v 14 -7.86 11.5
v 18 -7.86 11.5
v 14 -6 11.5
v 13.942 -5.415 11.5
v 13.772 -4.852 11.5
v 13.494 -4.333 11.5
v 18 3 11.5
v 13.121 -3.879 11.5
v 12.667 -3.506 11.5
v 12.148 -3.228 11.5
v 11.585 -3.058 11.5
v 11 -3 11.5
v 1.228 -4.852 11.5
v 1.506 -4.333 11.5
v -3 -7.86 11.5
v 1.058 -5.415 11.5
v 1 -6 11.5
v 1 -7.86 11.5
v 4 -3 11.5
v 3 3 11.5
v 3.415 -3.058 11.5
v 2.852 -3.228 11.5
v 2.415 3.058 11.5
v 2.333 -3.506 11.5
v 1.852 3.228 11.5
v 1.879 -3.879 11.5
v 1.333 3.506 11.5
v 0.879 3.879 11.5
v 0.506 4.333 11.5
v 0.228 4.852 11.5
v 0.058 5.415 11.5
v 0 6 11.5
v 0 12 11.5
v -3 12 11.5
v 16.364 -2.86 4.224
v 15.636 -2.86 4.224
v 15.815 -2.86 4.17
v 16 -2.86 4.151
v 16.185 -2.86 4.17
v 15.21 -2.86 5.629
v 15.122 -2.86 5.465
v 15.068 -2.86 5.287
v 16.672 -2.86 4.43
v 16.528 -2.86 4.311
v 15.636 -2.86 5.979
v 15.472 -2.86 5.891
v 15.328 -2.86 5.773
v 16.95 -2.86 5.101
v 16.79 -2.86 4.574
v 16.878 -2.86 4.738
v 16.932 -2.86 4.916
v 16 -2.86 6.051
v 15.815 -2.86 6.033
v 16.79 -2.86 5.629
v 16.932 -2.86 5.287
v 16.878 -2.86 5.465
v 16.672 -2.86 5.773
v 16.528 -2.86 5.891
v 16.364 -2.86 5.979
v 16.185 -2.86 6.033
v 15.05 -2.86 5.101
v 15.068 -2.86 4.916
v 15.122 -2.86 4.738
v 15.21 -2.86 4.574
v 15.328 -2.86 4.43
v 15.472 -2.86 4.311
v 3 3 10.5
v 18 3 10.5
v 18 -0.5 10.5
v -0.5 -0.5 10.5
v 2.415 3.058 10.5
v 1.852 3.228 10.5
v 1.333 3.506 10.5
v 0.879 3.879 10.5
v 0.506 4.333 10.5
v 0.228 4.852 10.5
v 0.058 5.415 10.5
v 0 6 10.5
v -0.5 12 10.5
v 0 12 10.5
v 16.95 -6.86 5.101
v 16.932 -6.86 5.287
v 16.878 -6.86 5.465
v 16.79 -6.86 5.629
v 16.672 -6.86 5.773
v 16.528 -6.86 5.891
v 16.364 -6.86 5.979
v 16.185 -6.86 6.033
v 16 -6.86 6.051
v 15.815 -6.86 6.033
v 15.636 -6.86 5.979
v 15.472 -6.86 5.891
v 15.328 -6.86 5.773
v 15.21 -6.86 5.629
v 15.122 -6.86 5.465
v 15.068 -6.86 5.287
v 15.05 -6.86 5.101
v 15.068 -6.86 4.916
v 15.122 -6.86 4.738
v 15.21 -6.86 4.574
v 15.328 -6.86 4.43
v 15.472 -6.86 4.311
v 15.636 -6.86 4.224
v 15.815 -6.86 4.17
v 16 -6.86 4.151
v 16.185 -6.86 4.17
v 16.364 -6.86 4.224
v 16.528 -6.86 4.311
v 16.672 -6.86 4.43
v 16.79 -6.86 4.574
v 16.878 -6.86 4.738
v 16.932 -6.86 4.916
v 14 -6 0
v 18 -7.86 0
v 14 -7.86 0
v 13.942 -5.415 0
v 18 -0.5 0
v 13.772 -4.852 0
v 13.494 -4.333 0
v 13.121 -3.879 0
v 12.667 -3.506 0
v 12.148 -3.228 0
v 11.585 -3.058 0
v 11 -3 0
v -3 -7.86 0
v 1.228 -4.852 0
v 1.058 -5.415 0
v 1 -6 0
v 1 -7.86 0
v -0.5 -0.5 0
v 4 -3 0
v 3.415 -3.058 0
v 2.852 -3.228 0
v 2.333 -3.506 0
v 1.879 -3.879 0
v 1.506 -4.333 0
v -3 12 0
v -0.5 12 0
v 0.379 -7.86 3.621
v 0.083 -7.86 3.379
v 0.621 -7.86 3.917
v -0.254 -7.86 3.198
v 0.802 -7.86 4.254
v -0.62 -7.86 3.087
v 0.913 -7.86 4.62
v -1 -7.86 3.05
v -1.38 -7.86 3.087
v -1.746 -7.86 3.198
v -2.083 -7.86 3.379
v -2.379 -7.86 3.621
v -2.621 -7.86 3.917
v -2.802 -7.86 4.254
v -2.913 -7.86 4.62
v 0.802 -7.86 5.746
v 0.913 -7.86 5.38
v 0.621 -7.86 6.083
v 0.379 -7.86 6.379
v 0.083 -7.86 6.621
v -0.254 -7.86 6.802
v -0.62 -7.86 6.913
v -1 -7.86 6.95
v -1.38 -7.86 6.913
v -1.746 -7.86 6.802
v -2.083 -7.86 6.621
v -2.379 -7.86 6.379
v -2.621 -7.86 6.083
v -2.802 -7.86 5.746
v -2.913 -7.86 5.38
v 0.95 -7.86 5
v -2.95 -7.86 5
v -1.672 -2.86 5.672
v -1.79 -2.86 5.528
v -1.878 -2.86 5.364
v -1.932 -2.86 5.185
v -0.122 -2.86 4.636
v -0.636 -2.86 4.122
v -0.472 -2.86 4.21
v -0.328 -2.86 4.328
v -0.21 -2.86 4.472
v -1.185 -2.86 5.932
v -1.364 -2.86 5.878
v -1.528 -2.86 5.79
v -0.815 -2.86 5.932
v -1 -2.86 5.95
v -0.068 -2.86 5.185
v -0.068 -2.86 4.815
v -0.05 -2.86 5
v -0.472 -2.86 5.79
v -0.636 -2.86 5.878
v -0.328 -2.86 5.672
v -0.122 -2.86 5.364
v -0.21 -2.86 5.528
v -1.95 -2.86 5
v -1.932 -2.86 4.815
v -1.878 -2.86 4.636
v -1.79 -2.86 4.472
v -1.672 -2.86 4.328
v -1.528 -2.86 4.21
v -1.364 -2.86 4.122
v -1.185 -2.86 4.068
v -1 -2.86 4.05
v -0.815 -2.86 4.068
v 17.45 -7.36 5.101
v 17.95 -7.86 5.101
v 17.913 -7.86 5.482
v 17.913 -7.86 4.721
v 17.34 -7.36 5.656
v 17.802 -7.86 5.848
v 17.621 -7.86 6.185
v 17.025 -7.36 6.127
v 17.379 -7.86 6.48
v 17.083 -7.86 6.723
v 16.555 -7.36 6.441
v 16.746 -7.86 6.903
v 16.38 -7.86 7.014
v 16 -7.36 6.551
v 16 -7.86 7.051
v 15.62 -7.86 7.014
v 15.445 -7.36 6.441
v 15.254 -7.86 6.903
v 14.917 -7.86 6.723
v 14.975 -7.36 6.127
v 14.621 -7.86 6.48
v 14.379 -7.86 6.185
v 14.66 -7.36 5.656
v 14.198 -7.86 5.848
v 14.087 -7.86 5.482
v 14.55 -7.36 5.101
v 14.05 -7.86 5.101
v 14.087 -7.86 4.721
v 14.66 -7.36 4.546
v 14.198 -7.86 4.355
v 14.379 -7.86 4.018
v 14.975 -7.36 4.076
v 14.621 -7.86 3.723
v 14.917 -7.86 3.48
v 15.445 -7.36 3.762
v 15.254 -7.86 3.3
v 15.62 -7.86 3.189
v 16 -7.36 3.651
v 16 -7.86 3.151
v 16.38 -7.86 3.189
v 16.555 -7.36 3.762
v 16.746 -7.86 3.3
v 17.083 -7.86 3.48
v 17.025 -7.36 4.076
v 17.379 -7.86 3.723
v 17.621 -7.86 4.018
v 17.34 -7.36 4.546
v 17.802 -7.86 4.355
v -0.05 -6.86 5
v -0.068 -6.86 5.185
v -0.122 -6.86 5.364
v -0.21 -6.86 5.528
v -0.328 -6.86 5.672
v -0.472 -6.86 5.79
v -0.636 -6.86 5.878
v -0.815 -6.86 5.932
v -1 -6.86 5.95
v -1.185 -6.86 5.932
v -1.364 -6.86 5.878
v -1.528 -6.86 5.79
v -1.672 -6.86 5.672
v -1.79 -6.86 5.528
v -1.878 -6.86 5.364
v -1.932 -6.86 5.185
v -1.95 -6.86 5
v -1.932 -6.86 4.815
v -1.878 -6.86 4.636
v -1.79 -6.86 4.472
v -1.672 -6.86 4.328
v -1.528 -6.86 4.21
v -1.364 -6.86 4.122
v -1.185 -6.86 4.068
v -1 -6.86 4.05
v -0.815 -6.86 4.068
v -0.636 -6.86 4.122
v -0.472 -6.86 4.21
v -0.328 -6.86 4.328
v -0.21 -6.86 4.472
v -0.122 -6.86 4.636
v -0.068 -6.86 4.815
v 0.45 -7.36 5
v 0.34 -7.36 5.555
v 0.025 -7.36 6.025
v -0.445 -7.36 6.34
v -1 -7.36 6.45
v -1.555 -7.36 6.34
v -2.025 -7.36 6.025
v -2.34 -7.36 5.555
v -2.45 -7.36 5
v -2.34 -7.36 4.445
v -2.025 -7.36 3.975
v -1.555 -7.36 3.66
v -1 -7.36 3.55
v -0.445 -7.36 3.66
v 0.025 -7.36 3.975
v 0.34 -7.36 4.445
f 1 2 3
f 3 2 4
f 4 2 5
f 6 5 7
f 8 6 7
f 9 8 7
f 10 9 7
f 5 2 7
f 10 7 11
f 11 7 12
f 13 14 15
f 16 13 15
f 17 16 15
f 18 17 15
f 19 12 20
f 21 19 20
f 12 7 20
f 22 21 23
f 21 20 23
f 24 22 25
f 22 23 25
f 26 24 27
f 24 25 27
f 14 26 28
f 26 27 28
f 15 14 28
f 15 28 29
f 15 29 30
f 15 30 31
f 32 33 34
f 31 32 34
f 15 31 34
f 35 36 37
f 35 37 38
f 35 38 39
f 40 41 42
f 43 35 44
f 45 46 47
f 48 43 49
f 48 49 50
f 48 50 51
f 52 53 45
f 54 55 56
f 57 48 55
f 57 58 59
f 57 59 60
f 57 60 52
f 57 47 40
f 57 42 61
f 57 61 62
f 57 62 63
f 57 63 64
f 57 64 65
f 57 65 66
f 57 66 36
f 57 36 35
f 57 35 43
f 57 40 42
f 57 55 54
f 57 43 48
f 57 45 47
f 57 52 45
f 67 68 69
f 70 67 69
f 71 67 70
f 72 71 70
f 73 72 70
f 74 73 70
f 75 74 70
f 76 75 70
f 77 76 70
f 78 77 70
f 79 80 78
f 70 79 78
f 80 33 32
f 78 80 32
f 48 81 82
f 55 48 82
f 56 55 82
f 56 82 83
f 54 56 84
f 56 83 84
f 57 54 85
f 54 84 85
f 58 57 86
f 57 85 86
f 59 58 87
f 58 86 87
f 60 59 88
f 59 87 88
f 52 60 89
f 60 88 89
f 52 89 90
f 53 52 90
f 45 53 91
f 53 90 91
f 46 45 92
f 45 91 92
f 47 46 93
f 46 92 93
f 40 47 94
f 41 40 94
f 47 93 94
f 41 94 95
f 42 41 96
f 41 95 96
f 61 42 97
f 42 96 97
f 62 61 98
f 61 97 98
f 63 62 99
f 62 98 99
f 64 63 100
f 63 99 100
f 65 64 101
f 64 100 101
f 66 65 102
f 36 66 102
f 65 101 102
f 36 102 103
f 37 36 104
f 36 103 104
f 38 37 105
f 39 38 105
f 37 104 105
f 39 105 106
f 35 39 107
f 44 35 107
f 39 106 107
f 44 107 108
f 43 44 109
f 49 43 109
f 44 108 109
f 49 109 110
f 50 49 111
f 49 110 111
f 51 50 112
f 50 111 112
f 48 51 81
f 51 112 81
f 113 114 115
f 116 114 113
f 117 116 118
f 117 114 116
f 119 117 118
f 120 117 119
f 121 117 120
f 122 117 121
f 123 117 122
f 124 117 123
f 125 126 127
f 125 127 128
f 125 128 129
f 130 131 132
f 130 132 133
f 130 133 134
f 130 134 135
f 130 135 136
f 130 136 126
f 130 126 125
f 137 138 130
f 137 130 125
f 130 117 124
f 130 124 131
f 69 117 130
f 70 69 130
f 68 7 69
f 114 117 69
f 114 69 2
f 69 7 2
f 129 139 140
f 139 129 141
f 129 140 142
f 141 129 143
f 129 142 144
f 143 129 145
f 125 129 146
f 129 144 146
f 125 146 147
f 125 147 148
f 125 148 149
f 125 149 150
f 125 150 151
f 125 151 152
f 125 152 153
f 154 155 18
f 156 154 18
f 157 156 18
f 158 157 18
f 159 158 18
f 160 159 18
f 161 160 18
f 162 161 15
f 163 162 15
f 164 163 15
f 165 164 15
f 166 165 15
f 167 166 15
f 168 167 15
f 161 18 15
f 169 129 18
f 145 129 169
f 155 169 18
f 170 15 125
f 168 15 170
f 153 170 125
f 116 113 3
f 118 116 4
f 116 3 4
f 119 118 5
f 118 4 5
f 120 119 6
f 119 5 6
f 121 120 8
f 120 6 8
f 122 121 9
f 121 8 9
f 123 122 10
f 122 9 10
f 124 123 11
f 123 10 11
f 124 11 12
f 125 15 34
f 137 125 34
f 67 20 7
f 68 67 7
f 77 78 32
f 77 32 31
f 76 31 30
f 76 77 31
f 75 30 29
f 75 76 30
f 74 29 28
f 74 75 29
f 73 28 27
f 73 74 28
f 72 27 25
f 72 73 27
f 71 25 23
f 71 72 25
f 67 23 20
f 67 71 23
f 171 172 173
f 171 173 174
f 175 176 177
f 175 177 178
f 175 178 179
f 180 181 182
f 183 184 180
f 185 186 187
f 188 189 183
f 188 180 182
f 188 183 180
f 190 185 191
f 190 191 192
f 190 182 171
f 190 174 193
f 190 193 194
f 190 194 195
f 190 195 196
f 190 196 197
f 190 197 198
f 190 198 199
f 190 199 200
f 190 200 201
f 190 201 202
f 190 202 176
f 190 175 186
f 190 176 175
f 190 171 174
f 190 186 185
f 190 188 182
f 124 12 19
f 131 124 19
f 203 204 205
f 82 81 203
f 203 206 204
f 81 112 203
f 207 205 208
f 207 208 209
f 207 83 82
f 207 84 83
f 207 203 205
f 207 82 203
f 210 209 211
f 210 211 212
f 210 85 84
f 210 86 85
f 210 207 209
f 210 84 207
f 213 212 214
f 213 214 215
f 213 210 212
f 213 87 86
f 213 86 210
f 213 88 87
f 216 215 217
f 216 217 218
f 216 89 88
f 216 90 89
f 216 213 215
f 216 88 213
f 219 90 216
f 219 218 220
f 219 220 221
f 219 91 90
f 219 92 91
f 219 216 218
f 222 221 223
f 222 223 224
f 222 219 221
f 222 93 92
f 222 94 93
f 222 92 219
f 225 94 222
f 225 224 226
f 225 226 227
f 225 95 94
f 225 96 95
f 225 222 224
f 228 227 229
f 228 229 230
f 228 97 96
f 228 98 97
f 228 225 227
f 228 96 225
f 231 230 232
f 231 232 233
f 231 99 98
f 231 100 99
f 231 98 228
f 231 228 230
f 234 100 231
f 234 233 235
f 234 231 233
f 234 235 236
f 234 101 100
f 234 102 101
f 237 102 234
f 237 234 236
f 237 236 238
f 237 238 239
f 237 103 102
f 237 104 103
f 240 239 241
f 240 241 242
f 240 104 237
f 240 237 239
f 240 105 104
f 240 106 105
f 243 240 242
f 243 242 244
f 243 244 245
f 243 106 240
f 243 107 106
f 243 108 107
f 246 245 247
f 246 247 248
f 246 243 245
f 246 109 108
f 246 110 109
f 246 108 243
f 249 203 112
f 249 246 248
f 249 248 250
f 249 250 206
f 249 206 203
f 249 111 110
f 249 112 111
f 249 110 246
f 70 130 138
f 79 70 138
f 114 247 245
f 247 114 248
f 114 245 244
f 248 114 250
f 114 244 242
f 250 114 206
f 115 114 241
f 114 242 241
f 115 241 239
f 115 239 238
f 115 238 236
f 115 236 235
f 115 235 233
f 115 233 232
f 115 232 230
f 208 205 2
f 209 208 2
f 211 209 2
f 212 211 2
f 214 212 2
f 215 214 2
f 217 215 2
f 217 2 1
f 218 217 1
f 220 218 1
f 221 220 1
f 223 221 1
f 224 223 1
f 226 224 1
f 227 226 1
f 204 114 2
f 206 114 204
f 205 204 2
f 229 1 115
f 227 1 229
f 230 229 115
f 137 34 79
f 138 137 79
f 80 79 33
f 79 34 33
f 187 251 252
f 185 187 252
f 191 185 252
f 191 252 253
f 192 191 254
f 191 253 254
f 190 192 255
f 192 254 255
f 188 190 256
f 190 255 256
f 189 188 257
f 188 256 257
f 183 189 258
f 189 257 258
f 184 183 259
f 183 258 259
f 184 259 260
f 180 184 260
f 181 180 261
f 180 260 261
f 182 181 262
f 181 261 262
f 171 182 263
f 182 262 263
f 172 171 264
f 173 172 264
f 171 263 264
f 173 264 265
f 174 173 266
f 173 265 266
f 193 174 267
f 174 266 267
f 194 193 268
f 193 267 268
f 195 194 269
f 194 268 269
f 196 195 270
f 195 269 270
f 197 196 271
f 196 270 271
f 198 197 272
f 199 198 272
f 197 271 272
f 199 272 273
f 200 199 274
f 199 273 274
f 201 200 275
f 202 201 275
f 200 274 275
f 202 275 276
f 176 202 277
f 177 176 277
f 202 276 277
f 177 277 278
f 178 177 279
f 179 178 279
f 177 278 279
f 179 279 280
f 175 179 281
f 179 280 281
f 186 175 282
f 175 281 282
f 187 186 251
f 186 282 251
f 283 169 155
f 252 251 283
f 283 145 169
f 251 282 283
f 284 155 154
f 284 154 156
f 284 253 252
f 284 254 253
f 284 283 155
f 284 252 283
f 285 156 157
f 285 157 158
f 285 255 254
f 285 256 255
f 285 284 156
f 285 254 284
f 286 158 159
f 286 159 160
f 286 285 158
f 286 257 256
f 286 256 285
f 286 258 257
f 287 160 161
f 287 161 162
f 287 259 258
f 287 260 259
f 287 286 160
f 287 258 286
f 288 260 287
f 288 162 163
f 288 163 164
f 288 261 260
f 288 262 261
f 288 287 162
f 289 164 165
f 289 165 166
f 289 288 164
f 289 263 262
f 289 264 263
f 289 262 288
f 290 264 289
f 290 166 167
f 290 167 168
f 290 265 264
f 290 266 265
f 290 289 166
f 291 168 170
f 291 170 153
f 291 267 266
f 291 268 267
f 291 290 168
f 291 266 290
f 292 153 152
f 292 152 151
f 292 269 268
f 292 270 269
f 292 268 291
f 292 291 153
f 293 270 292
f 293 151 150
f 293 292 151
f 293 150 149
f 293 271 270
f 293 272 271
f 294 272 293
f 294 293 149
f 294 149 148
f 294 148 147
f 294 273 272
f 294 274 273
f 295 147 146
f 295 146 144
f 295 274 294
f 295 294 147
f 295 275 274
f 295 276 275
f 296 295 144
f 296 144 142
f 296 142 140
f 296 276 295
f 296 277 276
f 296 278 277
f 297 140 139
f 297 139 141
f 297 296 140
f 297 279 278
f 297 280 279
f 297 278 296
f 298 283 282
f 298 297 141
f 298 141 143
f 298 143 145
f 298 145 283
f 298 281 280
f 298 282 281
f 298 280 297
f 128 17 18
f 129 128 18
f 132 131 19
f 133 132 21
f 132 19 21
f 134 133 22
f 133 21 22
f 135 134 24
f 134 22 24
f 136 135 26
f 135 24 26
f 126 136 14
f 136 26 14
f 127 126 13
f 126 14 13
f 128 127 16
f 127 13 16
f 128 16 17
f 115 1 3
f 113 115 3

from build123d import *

# Parameters (mm, degrees)
EXTRUDE_1_DEPTH        = 10
SKETCH_2_R             = 0.95
CUT_EXTRUDE_1_DEPTH    = 5
FILLET_1_R             = 3
CHAMFER_2_SIZE         = 1
EXTRUDE_START          = 1.5
EXTRUDE_2_DEPTH        = 1.5
FILLET_2_R             = 3
SKETCH_5_W             = 18.894194267
SKETCH_5_H             = 13.568314004
CUT_EXTRUDE_1877_DEPTH = 10.5


with BuildPart() as part:
    # 草图1 → 凸台-拉伸1 (new body)
    with BuildSketch(Plane.XY):
        Polygon((0, 0), (18, 0), (18, -7.86), (14, -7.86), (14, -3), (1, -3), (1, -7.86), (-3, -7.86), (-3, 12), (0, 12), align=None)
    extrude(amount=EXTRUDE_1_DEPTH)

    # 草图2 → 切除-拉伸1 (cut)
    with BuildSketch(Plane.XZ.offset(7.86)):
        with Locations((-1, 5)):
            Circle(SKETCH_2_R)
        with Locations((16, 5.10136652)):
            Circle(SKETCH_2_R)
    extrude(amount=-CUT_EXTRUDE_1_DEPTH, mode=Mode.SUBTRACT)

    # 圆角1
    fillet_1_edges = [part.edges().sort_by_distance(p)[0] for p in [
        (14, -3, 5),
        (1, -3, 5),
    ]]
    fillet(fillet_1_edges, radius=FILLET_1_R)

    # 倒角2
    chamfer_2_edges = [part.edges().sort_by_distance(p)[0] for p in [
        (-1.95, -7.86, 5),
        (15.05, -7.86, 5.10136652),
    ]]
    chamfer(chamfer_2_edges, length=CHAMFER_2_SIZE)

    # 草图4 → 凸台-拉伸2 (add)
    with BuildSketch(Plane.XY.offset(10).offset(EXTRUDE_START)):
        with BuildLine():
            Line((0, 12), (0, 3))
            Line((0, 3), (18, 3))
            Line((18, 3), (18, 0))
            Line((18, 0), (18, -7.86))
            Line((18, -7.86), (14, -7.86))
            Line((14, -7.86), (14, -6))
            ThreePointArc((14, -6), (13.121320344, -3.878679656), (11, -3))
            Line((11, -3), (4, -3))
            ThreePointArc((4, -3), (1.878679656, -3.878679656), (1, -6))
            Line((1, -6), (1, -7.86))
            Line((1, -7.86), (-3, -7.86))
            Line((-3, -7.86), (-3, 12))
            Line((-3, 12), (0, 12))
        make_face()
    extrude(amount=-EXTRUDE_2_DEPTH)

    # 圆角2
    fillet_2_edges = [part.edges().sort_by_distance(p)[0] for p in [
        (0, 3, 10.75),
    ]]
    fillet(fillet_2_edges, radius=FILLET_2_R)

    # 草图5 → Cut-Extrude 1877 (cut)
    with BuildSketch(Plane(origin=(0, 0, 0), x_dir=(-1, 0, 0), z_dir=(0, 0, -1))):
        with Locations((-8.947097133, 6.284157002)):
            Rectangle(SKETCH_5_W, SKETCH_5_H)
    extrude(amount=-CUT_EXTRUDE_1877_DEPTH, mode=Mode.SUBTRACT)


solid = part.part
